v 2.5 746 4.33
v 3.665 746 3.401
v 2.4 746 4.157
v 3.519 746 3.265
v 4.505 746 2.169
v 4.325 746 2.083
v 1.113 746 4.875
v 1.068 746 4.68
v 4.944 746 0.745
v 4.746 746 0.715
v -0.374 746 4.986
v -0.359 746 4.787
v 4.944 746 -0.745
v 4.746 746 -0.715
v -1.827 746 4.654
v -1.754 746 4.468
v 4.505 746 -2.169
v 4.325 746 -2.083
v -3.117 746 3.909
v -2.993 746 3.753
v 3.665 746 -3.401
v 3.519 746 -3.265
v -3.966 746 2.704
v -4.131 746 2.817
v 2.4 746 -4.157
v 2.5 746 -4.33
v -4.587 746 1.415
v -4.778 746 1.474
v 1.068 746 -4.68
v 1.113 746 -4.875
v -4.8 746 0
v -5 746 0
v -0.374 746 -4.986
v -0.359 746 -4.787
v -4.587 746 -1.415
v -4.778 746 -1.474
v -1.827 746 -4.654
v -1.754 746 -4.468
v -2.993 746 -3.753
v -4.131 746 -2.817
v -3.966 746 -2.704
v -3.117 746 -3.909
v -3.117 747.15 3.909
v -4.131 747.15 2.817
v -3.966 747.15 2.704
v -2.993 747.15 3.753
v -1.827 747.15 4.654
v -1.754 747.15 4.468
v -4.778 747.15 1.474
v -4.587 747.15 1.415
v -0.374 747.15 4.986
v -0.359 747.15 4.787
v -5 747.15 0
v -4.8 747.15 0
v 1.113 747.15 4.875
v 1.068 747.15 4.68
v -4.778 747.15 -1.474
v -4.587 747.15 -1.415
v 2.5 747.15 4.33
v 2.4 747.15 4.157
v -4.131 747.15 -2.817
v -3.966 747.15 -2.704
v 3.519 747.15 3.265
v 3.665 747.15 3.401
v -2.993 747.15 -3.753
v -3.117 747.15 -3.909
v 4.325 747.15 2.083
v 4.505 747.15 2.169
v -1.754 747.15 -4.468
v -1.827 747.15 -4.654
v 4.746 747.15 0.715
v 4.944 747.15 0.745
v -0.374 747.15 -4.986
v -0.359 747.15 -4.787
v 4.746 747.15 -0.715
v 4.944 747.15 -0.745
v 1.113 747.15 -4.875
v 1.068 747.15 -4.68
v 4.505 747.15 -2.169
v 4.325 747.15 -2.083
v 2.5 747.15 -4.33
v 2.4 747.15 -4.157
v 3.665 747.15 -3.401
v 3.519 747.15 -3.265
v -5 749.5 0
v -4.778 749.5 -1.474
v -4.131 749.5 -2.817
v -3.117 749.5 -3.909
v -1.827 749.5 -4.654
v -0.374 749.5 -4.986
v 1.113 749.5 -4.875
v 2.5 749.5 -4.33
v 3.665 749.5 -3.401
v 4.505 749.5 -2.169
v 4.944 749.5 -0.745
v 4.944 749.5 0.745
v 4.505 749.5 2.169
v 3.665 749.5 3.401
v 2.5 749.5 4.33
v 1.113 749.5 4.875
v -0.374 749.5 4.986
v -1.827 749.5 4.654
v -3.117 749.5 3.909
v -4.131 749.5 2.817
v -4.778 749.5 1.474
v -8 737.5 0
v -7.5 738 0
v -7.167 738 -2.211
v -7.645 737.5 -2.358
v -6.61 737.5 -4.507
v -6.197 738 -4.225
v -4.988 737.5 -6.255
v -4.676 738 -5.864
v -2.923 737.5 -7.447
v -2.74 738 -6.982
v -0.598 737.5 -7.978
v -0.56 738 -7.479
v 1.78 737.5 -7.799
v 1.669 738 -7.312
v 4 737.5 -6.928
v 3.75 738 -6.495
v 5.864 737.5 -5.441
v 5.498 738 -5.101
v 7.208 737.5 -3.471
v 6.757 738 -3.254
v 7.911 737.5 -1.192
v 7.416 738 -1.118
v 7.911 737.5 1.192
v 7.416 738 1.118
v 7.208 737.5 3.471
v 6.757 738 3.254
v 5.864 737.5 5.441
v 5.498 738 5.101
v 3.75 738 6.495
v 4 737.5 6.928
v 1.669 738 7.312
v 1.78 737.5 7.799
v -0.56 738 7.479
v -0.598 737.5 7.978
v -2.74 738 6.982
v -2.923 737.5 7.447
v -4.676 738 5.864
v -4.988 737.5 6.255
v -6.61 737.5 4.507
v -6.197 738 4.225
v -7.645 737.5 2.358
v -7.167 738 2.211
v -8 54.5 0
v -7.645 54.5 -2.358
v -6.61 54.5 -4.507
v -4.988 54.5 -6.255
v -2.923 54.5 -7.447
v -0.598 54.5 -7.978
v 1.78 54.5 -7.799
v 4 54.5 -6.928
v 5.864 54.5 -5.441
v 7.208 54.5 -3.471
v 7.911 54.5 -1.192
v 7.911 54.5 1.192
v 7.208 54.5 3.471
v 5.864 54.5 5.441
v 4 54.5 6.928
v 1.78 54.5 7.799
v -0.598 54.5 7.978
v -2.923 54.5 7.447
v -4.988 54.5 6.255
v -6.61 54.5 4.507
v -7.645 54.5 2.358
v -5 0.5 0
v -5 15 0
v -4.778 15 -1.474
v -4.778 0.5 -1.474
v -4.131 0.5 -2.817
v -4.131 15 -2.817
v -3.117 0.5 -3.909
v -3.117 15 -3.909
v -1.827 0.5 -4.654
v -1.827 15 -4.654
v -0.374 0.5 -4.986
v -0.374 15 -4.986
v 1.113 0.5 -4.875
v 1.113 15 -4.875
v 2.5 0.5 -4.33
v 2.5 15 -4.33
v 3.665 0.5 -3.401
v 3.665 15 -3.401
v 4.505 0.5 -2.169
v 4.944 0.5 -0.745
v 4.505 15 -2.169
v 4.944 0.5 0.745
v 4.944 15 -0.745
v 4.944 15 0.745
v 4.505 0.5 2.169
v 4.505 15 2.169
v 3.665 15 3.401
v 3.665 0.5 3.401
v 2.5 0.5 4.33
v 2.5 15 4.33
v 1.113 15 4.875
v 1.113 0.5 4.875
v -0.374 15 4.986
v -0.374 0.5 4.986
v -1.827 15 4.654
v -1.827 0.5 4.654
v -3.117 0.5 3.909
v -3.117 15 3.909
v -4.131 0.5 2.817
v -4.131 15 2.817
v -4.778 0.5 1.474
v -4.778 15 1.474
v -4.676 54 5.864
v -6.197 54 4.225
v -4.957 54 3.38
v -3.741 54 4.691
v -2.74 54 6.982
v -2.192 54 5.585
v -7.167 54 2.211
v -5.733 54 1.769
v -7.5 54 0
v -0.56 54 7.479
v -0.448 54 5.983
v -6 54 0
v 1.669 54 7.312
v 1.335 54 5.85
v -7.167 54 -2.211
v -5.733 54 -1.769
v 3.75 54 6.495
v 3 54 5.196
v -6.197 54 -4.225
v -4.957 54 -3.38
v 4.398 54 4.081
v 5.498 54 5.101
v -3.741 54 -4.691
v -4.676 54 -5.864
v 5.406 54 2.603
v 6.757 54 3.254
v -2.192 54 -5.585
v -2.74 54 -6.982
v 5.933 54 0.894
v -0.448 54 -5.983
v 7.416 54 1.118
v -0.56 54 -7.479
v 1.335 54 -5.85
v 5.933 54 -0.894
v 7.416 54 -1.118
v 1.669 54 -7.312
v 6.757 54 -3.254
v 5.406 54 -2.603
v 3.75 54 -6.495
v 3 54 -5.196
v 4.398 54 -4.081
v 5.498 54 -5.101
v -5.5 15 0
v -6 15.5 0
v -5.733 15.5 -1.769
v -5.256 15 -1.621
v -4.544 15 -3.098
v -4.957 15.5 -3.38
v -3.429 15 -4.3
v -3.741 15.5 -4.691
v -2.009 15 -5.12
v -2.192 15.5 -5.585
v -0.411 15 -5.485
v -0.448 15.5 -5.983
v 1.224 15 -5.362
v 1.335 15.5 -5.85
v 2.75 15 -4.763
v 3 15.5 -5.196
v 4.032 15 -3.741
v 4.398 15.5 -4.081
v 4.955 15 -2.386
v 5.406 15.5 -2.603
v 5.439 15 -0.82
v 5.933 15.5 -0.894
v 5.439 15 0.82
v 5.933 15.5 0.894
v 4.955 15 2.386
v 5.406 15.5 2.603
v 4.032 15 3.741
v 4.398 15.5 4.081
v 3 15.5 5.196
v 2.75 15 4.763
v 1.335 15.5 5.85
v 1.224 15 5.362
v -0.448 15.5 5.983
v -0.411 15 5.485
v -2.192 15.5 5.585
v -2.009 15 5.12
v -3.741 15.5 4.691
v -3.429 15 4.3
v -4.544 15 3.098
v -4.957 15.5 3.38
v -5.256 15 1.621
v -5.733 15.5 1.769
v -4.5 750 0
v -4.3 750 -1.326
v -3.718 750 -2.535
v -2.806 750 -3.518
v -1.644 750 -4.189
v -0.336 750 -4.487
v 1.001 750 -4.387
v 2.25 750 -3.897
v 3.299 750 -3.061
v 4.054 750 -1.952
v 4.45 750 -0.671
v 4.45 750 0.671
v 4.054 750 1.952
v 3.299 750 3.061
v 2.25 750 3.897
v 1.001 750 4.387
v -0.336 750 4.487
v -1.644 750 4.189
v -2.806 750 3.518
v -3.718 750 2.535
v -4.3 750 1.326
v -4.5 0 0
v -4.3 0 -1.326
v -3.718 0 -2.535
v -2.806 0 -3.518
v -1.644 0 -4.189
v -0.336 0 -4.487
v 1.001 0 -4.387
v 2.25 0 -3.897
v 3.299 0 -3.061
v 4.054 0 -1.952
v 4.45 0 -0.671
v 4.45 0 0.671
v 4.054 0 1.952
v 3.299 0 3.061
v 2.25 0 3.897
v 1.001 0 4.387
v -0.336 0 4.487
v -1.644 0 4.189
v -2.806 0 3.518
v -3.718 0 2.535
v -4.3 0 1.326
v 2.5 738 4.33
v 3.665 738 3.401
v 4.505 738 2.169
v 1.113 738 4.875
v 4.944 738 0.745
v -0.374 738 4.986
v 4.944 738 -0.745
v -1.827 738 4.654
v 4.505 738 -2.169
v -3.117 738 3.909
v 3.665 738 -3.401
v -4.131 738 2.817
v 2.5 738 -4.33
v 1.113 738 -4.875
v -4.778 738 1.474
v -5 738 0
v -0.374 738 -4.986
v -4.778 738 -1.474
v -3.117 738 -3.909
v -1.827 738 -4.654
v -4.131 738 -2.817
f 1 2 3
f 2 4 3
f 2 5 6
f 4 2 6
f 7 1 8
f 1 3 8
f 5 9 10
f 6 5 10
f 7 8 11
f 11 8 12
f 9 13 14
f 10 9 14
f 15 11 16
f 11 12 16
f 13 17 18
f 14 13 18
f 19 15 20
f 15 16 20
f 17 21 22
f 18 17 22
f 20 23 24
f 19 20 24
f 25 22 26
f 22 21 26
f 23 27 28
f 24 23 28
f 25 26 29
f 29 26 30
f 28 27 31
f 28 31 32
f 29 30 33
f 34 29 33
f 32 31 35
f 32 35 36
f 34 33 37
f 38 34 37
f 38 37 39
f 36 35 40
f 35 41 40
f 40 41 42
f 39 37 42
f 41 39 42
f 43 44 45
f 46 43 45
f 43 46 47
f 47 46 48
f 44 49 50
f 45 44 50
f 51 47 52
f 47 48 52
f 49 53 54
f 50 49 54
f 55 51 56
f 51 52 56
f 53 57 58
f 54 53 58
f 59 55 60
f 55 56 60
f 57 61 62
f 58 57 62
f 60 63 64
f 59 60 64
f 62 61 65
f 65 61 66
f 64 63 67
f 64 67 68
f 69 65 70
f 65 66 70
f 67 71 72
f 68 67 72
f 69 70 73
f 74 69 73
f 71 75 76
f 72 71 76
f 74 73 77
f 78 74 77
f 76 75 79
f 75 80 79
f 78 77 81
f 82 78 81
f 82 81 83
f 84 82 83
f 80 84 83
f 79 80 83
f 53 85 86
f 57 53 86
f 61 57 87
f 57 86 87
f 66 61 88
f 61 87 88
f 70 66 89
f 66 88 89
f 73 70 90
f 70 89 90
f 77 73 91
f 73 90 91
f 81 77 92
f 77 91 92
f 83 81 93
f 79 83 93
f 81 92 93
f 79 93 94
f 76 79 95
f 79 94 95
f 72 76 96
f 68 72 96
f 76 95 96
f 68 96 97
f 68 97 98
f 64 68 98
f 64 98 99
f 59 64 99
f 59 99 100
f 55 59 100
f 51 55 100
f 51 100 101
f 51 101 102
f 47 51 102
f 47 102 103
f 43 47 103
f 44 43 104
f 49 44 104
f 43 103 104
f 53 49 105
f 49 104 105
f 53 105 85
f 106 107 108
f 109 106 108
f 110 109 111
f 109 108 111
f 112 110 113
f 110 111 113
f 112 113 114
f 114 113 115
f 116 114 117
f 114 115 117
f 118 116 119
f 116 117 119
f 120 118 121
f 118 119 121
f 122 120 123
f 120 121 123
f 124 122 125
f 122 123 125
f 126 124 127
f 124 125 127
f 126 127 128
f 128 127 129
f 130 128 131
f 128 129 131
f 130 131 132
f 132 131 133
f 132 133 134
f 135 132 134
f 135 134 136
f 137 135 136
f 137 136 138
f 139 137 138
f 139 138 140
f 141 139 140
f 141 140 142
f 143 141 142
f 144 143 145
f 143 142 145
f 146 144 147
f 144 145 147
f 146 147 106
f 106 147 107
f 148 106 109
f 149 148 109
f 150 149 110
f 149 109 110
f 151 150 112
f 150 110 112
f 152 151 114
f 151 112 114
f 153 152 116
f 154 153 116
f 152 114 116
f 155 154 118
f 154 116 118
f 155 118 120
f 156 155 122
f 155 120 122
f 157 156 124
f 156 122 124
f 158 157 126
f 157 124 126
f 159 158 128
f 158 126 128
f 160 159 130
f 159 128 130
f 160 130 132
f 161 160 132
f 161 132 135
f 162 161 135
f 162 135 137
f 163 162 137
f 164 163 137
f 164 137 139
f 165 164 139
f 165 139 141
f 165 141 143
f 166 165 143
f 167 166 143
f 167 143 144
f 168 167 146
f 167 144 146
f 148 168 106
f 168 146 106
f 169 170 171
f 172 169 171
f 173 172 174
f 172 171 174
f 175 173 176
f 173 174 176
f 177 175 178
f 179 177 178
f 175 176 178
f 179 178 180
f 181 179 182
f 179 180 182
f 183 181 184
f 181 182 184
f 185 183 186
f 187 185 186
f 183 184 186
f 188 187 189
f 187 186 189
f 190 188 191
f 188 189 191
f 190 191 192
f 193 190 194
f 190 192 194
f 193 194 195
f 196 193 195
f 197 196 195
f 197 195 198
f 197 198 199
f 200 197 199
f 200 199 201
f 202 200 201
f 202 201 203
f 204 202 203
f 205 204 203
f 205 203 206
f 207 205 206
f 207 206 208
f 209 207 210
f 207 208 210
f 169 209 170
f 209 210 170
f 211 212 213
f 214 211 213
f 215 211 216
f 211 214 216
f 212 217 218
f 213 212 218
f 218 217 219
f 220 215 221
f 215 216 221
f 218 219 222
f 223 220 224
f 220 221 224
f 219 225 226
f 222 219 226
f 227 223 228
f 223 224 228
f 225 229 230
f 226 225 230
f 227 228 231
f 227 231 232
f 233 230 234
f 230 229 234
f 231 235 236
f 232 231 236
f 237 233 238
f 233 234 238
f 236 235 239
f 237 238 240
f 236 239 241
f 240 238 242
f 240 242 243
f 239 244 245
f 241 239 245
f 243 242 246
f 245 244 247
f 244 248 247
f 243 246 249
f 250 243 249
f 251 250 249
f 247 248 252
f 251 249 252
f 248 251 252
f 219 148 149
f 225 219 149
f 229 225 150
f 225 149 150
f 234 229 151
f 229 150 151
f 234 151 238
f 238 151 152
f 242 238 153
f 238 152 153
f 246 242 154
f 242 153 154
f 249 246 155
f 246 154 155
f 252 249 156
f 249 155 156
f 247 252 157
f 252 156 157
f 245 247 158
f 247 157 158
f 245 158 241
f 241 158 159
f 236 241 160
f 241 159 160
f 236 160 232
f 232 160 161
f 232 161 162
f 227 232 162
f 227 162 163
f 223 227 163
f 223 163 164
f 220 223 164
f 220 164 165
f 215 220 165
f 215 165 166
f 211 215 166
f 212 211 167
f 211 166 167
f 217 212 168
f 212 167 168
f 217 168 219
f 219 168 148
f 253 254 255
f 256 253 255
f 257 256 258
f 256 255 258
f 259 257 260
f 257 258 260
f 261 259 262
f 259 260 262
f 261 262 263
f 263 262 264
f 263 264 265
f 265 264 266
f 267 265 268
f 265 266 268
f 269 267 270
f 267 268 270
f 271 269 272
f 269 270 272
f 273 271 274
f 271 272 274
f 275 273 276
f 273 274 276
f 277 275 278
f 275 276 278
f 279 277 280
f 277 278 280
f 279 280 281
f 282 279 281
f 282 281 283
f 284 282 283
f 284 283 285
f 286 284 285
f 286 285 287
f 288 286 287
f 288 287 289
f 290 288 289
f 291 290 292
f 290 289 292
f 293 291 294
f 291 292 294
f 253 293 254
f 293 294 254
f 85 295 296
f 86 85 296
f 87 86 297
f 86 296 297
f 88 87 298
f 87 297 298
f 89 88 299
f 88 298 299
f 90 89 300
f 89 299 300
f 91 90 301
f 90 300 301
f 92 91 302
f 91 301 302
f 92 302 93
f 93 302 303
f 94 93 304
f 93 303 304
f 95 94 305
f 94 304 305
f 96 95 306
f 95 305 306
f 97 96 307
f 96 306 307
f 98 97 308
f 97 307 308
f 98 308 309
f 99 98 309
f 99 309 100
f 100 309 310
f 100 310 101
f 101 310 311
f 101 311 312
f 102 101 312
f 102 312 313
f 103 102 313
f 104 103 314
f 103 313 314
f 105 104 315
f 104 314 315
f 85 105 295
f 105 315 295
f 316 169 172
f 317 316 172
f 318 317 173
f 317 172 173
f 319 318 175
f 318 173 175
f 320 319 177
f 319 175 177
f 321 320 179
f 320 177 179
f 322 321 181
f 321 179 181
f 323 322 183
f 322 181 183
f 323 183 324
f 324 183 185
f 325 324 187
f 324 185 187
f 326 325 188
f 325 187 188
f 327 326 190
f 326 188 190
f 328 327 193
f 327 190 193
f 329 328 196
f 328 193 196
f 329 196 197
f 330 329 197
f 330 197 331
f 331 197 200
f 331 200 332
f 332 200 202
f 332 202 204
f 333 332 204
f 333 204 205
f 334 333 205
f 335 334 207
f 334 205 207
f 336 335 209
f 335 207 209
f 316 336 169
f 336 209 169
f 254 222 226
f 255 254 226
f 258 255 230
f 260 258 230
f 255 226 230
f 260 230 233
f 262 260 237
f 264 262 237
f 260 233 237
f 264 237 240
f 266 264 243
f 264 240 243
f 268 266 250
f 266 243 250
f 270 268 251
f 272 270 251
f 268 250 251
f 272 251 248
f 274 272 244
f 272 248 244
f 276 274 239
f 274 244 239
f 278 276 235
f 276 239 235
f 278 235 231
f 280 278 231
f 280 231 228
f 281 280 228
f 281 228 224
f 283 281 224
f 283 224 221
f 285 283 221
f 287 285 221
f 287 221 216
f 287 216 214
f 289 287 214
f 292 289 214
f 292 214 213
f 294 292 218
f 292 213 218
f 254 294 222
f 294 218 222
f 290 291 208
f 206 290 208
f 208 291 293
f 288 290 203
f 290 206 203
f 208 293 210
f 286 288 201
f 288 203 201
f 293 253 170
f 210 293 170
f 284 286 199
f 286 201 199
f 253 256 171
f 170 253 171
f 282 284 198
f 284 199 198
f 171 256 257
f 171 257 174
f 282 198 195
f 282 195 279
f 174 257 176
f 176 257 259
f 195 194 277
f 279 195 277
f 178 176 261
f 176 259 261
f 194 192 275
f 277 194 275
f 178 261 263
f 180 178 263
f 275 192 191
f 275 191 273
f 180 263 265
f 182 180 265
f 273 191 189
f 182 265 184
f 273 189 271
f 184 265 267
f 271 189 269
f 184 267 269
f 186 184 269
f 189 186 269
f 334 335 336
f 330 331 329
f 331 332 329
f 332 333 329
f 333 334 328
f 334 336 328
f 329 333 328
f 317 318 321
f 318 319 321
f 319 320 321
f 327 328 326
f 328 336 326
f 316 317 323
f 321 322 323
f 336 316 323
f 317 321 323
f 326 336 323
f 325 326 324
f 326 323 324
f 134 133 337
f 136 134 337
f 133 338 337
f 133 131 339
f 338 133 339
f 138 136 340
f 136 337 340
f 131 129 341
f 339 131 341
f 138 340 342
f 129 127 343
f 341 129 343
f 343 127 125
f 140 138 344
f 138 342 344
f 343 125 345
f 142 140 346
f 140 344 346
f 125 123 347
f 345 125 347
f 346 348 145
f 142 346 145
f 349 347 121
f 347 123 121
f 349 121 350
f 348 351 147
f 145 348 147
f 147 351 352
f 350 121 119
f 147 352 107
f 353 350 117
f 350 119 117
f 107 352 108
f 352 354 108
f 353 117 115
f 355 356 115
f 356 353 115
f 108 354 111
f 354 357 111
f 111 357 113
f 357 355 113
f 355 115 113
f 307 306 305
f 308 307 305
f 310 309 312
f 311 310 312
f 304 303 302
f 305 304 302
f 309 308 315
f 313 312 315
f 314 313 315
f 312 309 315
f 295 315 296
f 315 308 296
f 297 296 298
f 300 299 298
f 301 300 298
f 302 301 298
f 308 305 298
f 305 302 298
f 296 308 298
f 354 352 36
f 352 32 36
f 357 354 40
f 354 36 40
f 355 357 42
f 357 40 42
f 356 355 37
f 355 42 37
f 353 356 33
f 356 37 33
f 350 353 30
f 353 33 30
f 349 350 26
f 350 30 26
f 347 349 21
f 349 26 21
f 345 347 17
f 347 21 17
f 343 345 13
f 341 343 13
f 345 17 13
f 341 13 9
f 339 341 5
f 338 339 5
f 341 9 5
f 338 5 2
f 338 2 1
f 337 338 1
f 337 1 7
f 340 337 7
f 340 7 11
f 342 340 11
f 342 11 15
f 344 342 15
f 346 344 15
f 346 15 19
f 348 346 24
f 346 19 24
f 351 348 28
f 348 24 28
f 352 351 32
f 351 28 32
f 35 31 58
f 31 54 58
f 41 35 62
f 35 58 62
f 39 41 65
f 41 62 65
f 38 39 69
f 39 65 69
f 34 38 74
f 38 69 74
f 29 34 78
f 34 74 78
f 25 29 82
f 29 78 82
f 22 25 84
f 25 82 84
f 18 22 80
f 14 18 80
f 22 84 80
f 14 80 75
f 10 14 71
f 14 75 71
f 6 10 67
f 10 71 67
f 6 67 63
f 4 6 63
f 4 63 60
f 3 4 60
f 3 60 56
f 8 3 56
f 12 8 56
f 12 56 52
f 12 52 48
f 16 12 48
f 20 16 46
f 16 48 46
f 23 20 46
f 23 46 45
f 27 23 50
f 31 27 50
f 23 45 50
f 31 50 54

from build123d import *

# Parameters (mm, degrees)
CHAMFER_1_SIZE = 0.5


with BuildPart() as part:
    # Эскиз1 → Повернуть1 (revolve)
    with BuildSketch(Plane.XY):
        Polygon((0, 0), (-5, 0), (-5, 15), (-6, 15), (-6, 54), (-8, 54), (-8, 738), (-5, 738), (-5, 746), (-4.8, 746), (-4.8, 747.15), (-5, 747.15), (-5, 750), (0, 750), align=None)
    revolve(axis=Axis((0, 750, 0), (0, -1, 0)))

    # Фаска1
    chamfer_1_edges = [part.edges().sort_by_distance(p)[0] for p in [
        (8, 738, 0),
        (8, 54, 0),
        (6, 15, 0),
        (5, 0, 0),
        (5, 750, 0),
    ]]
    chamfer(chamfer_1_edges, length=CHAMFER_1_SIZE)


solid = part.part
